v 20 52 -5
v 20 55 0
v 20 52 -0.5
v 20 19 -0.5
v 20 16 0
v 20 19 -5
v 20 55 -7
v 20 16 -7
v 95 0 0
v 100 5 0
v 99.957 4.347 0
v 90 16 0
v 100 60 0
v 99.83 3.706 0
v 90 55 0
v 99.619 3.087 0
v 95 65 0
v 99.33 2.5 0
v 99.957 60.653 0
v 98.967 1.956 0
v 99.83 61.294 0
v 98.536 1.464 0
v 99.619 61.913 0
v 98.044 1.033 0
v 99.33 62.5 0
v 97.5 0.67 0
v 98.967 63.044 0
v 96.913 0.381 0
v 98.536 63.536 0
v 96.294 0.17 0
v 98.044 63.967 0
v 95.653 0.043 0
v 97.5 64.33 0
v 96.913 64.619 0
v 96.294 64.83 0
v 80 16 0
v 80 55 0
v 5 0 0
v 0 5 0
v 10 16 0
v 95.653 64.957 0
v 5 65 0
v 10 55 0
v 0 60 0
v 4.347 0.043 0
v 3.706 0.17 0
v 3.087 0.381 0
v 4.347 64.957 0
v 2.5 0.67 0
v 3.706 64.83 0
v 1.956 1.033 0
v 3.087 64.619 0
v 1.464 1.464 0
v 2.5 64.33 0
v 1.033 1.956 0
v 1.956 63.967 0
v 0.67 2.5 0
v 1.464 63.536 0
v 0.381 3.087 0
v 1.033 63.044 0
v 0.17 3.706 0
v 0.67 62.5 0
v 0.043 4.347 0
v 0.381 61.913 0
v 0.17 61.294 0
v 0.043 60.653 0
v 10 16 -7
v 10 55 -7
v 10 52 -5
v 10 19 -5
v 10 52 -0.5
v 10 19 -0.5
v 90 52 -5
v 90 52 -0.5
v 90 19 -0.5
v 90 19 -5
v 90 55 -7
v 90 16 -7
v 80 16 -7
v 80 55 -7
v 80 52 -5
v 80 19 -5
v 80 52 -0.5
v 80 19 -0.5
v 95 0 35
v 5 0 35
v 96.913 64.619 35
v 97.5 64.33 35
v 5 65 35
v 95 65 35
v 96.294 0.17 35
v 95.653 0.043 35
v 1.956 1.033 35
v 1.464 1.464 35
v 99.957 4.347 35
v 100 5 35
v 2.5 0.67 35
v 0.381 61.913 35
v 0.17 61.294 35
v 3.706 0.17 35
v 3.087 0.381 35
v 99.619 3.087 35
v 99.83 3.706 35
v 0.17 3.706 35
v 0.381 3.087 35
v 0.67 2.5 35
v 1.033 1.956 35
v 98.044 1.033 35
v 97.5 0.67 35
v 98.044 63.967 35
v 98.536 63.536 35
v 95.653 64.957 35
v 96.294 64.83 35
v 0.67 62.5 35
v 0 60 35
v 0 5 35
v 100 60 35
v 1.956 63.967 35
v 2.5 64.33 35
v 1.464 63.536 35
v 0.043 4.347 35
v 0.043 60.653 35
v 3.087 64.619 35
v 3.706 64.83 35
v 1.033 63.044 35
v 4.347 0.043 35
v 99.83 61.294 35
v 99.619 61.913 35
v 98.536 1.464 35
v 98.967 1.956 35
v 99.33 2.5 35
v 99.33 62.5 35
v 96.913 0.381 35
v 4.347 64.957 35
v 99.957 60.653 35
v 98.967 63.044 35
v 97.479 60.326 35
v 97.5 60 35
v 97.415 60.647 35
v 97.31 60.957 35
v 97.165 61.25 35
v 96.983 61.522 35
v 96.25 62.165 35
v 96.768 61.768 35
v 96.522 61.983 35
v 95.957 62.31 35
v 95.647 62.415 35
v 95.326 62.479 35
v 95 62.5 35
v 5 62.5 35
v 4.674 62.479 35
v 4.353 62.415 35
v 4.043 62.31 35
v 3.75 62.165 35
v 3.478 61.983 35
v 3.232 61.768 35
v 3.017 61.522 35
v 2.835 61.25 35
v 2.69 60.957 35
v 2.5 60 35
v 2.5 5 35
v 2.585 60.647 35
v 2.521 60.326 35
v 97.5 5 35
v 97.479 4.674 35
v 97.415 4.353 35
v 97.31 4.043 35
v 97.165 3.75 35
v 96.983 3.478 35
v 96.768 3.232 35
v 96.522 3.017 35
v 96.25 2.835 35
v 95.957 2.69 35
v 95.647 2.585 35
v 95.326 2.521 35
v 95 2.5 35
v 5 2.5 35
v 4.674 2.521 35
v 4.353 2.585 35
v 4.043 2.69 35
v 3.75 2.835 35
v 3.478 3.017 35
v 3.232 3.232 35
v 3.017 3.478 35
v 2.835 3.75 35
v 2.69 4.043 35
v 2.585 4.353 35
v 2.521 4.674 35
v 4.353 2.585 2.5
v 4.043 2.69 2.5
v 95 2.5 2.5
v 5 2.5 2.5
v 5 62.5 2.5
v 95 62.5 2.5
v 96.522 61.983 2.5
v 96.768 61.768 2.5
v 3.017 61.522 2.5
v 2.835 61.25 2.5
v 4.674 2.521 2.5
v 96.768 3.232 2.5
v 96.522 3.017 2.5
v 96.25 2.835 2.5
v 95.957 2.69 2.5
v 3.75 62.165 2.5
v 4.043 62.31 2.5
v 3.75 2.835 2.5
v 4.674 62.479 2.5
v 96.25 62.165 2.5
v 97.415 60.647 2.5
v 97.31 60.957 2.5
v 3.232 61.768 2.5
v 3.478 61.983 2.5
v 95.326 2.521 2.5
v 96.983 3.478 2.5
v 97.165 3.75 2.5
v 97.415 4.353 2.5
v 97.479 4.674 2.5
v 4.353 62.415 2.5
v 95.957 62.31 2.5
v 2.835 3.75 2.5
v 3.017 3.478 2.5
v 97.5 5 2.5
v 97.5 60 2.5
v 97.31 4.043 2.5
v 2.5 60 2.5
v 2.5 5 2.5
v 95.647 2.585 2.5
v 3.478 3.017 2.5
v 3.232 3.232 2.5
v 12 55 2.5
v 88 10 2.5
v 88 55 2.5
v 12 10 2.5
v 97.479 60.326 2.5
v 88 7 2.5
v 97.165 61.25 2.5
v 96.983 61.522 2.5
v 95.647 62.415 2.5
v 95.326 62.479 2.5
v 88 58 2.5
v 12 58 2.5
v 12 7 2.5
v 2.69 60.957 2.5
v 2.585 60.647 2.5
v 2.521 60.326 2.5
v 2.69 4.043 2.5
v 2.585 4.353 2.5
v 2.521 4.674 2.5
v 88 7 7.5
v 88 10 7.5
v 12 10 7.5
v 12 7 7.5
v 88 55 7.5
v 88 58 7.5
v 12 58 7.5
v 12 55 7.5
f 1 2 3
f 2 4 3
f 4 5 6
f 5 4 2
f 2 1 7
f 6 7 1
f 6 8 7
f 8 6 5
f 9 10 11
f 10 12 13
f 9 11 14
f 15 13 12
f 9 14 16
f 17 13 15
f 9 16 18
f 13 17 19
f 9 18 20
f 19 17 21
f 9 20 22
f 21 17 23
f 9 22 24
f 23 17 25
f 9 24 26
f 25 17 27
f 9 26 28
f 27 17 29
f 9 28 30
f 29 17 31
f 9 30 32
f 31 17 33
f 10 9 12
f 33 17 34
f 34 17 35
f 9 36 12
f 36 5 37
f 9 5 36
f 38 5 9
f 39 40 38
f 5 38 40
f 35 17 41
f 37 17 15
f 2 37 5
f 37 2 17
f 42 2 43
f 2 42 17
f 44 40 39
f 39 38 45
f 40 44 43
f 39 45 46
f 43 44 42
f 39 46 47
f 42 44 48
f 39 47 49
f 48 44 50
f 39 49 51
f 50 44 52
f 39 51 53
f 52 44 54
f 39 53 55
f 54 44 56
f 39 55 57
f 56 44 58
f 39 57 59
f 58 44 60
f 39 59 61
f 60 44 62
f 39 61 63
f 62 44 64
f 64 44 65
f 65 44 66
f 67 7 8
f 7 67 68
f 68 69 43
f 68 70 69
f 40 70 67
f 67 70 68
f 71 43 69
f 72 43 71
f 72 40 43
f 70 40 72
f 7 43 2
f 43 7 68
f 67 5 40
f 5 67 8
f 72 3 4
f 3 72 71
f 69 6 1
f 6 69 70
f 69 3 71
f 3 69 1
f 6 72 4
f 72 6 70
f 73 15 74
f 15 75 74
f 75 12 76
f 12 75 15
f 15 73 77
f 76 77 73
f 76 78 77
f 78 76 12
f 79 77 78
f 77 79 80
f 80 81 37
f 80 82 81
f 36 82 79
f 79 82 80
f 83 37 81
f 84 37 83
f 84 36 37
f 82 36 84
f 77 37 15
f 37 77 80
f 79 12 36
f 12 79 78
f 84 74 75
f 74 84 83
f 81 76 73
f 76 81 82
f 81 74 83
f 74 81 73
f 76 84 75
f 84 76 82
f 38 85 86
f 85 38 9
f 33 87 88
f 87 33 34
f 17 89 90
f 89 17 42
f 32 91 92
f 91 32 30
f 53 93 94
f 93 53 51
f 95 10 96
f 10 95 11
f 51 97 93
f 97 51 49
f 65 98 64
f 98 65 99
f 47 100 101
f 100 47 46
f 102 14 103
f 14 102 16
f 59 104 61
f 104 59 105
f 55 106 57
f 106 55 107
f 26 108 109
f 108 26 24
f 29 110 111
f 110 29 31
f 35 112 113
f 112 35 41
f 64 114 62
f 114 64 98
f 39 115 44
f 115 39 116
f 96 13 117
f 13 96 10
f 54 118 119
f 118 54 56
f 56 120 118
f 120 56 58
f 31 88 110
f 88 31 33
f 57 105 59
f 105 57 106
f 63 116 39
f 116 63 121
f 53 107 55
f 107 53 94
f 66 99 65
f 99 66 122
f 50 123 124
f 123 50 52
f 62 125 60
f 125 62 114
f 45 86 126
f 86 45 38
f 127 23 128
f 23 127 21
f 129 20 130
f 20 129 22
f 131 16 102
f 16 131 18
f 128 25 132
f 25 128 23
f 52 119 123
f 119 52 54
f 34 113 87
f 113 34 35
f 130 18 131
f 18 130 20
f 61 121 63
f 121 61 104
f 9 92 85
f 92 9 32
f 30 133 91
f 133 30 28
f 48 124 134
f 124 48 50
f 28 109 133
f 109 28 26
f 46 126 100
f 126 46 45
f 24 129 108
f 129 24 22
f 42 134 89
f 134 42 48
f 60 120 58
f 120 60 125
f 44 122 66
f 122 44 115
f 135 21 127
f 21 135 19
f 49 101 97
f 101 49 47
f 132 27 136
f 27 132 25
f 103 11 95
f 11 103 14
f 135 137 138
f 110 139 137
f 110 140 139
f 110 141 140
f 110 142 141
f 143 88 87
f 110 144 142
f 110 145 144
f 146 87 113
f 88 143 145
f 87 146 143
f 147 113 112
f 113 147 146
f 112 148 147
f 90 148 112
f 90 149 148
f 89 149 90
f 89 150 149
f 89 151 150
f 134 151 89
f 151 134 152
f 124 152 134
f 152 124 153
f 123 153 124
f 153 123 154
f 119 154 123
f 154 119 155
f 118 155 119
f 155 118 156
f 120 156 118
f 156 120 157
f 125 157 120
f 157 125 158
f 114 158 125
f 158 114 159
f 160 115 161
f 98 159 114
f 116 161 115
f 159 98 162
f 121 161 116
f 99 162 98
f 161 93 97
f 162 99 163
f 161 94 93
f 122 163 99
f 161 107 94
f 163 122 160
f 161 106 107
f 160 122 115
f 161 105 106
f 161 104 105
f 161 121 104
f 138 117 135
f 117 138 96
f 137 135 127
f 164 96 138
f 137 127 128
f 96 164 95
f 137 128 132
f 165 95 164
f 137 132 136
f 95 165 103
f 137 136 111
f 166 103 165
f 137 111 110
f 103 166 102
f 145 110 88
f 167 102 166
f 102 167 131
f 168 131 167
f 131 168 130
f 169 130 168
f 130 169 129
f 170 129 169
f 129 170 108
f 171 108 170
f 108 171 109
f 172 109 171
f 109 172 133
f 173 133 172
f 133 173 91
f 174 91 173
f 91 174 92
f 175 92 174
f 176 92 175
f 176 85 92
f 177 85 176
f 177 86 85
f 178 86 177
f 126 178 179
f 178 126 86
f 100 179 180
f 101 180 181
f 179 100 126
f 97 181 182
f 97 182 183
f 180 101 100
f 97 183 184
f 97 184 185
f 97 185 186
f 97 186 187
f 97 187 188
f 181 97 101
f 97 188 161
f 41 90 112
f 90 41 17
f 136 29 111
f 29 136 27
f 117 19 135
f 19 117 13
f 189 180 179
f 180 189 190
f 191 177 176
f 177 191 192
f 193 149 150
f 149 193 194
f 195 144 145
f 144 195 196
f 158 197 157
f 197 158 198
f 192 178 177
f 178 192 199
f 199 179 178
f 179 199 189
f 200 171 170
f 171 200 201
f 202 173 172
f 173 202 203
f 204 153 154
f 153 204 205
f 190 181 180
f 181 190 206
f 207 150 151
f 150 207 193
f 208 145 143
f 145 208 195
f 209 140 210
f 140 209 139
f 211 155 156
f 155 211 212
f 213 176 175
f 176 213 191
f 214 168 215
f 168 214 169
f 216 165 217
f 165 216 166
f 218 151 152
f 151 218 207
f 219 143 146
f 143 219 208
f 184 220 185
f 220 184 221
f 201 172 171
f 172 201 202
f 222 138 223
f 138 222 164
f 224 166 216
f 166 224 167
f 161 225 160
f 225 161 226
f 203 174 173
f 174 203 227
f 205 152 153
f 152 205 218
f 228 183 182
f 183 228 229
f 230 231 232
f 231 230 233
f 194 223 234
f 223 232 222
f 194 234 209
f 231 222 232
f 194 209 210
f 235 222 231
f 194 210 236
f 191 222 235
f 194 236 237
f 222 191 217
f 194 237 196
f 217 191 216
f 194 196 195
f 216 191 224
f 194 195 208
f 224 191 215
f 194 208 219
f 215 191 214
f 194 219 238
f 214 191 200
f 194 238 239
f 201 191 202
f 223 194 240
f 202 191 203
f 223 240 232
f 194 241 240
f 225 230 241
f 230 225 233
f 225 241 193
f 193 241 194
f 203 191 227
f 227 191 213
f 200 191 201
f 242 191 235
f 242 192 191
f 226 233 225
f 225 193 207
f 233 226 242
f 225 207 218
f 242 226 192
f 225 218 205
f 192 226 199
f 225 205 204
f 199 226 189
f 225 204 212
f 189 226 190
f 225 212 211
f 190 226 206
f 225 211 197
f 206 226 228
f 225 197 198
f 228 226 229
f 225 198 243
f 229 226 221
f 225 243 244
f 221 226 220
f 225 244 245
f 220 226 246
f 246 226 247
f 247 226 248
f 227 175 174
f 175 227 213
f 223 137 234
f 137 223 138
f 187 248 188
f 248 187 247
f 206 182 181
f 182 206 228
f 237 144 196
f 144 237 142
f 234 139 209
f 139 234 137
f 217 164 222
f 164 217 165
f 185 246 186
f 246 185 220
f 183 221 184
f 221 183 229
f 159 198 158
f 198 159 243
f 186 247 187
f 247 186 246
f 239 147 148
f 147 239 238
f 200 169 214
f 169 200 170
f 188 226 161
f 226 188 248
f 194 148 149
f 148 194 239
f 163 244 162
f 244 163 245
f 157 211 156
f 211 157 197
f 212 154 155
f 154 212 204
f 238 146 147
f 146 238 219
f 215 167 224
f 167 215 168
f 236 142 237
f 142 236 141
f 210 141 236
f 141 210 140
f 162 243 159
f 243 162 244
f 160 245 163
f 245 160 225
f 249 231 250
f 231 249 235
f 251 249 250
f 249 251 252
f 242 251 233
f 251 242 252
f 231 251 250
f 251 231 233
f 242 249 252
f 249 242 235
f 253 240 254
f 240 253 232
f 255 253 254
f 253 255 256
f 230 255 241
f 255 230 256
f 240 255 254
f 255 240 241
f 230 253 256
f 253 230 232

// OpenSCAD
// ==================================================
// CATTLEAI - DUAL ENCLOSURE DESIGN
// Units: millimeters
// ==================================================

// SELECT PART:
// "power_box"
// "power_lid"
// "sensor_box"
// "sensor_lid"

part = "sensor_box";

$fn = 48;

// ==================================================
// GENERAL PARAMETERS
// ==================================================

wall = 2.5;
floor_thickness = 2.5;

lid_thickness = 3;

corner_radius = 5;

strap_width = 31;
strap_slot_width = strap_width + 2;
strap_slot_height = 4.5;

cable_diameter = 6;

// Power box
power_length = 90;
power_width = 60;
power_height = 30;

// Sensor box
sensor_length = 100;
sensor_width = 65;
sensor_height = 35;

// PCB
pcb_length = 76;
pcb_width = 51;

pcb_support_height = 5;


// ==================================================
// ROUNDED RECTANGULAR PRISM
// ==================================================

module rounded_box(l, w, h, r) {

    hull() {

        for (x = [r, l-r])
        for (y = [r, w-r]) {

            translate([x, y, 0])
                cylinder(
                    h = h,
                    r = r
                );

        }

    }

}


// ==================================================
// STRAP MOUNTING LOOPS
// External loops below the enclosure.
// ==================================================

module strap_mounts(l, w) {

    strap_gap = strap_slot_height;

    loop_thickness = 3;

    for (x = [15, l-15]) {

        translate([
            x - 5,
            (w-strap_slot_width)/2,
            -7
        ])

        difference() {

            cube([
                10,
                strap_slot_width + 6,
                7
            ]);

            translate([
                -1,
                3,
                2
            ])

            cube([
                12,
                strap_slot_width,
                strap_gap
            ]);

        }

    }

}


// ==================================================
// MAIN BOX SHELL
// ==================================================

module enclosure_shell(l, w, h) {

    difference() {

        union() {

            rounded_box(
                l,
                w,
                h,
                corner_radius
            );

            strap_mounts(
                l,
                w
            );

        }

        // Main internal cavity.
        // Open at the top.

        translate([
            wall,
            wall,
            floor_thickness
        ])

        rounded_box(
            l - 2*wall,
            w - 2*wall,
            h,
            corner_radius - wall
        );

        // Side cable opening.

        translate([
            l/2,
            -1,
            h/2
        ])

        rotate([
            90,
            0,
            0
        ])

        cylinder(
            h = wall + 3,
            d = cable_diameter
        );

    }

}


// ==================================================
// PCB SUPPORT RAILS
// Sensor box only.
// ==================================================

module pcb_supports() {

    x0 = (sensor_length-pcb_length)/2;
    y0 = (sensor_width-pcb_width)/2;

    rail_width = 3;

    translate([
        x0,
        y0,
        floor_thickness
    ])

    cube([
        pcb_length,
        rail_width,
        pcb_support_height
    ]);

    translate([
        x0,
        y0 + pcb_width - rail_width,
        floor_thickness
    ])

    cube([
        pcb_length,
        rail_width,
        pcb_support_height
    ]);

}


// ==================================================
// LID
// ==================================================

module enclosure_lid(l, w) {

    // Flat cover with internal alignment lip.

    union() {

        rounded_box(
            l,
            w,
            lid_thickness,
            corner_radius
        );

        translate([
            wall + 0.3,
            wall + 0.3,
            -2
        ])

        difference() {

            rounded_box(
                l - 2*wall - 0.6,
                w - 2*wall - 0.6,
                2,
                corner_radius - wall
            );

            translate([
                2,
                2,
                -1
            ])

            rounded_box(
                l - 2*wall - 4.6,
                w - 2*wall - 4.6,
                4,
                corner_radius - wall - 1
            );

        }

    }

}


// ==================================================
// POWER BOX
// ==================================================

module power_box() {

    enclosure_shell(
        power_length,
        power_width,
        power_height
    );

}


// ==================================================
// SENSOR BOX
// ==================================================

module sensor_box() {

    union() {

        enclosure_shell(
            sensor_length,
            sensor_width,
            sensor_height
        );

        pcb_supports();

    }

}


// ==================================================
// SELECT OUTPUT
// ==================================================

if (part == "power_box") {

    power_box();

}

if (part == "power_lid") {

    enclosure_lid(
        power_length,
        power_width
    );

}

if (part == "sensor_box") {

    sensor_box();

}

if (part == "sensor_lid") {

    enclosure_lid(
        sensor_length,
        sensor_width
    );

}
